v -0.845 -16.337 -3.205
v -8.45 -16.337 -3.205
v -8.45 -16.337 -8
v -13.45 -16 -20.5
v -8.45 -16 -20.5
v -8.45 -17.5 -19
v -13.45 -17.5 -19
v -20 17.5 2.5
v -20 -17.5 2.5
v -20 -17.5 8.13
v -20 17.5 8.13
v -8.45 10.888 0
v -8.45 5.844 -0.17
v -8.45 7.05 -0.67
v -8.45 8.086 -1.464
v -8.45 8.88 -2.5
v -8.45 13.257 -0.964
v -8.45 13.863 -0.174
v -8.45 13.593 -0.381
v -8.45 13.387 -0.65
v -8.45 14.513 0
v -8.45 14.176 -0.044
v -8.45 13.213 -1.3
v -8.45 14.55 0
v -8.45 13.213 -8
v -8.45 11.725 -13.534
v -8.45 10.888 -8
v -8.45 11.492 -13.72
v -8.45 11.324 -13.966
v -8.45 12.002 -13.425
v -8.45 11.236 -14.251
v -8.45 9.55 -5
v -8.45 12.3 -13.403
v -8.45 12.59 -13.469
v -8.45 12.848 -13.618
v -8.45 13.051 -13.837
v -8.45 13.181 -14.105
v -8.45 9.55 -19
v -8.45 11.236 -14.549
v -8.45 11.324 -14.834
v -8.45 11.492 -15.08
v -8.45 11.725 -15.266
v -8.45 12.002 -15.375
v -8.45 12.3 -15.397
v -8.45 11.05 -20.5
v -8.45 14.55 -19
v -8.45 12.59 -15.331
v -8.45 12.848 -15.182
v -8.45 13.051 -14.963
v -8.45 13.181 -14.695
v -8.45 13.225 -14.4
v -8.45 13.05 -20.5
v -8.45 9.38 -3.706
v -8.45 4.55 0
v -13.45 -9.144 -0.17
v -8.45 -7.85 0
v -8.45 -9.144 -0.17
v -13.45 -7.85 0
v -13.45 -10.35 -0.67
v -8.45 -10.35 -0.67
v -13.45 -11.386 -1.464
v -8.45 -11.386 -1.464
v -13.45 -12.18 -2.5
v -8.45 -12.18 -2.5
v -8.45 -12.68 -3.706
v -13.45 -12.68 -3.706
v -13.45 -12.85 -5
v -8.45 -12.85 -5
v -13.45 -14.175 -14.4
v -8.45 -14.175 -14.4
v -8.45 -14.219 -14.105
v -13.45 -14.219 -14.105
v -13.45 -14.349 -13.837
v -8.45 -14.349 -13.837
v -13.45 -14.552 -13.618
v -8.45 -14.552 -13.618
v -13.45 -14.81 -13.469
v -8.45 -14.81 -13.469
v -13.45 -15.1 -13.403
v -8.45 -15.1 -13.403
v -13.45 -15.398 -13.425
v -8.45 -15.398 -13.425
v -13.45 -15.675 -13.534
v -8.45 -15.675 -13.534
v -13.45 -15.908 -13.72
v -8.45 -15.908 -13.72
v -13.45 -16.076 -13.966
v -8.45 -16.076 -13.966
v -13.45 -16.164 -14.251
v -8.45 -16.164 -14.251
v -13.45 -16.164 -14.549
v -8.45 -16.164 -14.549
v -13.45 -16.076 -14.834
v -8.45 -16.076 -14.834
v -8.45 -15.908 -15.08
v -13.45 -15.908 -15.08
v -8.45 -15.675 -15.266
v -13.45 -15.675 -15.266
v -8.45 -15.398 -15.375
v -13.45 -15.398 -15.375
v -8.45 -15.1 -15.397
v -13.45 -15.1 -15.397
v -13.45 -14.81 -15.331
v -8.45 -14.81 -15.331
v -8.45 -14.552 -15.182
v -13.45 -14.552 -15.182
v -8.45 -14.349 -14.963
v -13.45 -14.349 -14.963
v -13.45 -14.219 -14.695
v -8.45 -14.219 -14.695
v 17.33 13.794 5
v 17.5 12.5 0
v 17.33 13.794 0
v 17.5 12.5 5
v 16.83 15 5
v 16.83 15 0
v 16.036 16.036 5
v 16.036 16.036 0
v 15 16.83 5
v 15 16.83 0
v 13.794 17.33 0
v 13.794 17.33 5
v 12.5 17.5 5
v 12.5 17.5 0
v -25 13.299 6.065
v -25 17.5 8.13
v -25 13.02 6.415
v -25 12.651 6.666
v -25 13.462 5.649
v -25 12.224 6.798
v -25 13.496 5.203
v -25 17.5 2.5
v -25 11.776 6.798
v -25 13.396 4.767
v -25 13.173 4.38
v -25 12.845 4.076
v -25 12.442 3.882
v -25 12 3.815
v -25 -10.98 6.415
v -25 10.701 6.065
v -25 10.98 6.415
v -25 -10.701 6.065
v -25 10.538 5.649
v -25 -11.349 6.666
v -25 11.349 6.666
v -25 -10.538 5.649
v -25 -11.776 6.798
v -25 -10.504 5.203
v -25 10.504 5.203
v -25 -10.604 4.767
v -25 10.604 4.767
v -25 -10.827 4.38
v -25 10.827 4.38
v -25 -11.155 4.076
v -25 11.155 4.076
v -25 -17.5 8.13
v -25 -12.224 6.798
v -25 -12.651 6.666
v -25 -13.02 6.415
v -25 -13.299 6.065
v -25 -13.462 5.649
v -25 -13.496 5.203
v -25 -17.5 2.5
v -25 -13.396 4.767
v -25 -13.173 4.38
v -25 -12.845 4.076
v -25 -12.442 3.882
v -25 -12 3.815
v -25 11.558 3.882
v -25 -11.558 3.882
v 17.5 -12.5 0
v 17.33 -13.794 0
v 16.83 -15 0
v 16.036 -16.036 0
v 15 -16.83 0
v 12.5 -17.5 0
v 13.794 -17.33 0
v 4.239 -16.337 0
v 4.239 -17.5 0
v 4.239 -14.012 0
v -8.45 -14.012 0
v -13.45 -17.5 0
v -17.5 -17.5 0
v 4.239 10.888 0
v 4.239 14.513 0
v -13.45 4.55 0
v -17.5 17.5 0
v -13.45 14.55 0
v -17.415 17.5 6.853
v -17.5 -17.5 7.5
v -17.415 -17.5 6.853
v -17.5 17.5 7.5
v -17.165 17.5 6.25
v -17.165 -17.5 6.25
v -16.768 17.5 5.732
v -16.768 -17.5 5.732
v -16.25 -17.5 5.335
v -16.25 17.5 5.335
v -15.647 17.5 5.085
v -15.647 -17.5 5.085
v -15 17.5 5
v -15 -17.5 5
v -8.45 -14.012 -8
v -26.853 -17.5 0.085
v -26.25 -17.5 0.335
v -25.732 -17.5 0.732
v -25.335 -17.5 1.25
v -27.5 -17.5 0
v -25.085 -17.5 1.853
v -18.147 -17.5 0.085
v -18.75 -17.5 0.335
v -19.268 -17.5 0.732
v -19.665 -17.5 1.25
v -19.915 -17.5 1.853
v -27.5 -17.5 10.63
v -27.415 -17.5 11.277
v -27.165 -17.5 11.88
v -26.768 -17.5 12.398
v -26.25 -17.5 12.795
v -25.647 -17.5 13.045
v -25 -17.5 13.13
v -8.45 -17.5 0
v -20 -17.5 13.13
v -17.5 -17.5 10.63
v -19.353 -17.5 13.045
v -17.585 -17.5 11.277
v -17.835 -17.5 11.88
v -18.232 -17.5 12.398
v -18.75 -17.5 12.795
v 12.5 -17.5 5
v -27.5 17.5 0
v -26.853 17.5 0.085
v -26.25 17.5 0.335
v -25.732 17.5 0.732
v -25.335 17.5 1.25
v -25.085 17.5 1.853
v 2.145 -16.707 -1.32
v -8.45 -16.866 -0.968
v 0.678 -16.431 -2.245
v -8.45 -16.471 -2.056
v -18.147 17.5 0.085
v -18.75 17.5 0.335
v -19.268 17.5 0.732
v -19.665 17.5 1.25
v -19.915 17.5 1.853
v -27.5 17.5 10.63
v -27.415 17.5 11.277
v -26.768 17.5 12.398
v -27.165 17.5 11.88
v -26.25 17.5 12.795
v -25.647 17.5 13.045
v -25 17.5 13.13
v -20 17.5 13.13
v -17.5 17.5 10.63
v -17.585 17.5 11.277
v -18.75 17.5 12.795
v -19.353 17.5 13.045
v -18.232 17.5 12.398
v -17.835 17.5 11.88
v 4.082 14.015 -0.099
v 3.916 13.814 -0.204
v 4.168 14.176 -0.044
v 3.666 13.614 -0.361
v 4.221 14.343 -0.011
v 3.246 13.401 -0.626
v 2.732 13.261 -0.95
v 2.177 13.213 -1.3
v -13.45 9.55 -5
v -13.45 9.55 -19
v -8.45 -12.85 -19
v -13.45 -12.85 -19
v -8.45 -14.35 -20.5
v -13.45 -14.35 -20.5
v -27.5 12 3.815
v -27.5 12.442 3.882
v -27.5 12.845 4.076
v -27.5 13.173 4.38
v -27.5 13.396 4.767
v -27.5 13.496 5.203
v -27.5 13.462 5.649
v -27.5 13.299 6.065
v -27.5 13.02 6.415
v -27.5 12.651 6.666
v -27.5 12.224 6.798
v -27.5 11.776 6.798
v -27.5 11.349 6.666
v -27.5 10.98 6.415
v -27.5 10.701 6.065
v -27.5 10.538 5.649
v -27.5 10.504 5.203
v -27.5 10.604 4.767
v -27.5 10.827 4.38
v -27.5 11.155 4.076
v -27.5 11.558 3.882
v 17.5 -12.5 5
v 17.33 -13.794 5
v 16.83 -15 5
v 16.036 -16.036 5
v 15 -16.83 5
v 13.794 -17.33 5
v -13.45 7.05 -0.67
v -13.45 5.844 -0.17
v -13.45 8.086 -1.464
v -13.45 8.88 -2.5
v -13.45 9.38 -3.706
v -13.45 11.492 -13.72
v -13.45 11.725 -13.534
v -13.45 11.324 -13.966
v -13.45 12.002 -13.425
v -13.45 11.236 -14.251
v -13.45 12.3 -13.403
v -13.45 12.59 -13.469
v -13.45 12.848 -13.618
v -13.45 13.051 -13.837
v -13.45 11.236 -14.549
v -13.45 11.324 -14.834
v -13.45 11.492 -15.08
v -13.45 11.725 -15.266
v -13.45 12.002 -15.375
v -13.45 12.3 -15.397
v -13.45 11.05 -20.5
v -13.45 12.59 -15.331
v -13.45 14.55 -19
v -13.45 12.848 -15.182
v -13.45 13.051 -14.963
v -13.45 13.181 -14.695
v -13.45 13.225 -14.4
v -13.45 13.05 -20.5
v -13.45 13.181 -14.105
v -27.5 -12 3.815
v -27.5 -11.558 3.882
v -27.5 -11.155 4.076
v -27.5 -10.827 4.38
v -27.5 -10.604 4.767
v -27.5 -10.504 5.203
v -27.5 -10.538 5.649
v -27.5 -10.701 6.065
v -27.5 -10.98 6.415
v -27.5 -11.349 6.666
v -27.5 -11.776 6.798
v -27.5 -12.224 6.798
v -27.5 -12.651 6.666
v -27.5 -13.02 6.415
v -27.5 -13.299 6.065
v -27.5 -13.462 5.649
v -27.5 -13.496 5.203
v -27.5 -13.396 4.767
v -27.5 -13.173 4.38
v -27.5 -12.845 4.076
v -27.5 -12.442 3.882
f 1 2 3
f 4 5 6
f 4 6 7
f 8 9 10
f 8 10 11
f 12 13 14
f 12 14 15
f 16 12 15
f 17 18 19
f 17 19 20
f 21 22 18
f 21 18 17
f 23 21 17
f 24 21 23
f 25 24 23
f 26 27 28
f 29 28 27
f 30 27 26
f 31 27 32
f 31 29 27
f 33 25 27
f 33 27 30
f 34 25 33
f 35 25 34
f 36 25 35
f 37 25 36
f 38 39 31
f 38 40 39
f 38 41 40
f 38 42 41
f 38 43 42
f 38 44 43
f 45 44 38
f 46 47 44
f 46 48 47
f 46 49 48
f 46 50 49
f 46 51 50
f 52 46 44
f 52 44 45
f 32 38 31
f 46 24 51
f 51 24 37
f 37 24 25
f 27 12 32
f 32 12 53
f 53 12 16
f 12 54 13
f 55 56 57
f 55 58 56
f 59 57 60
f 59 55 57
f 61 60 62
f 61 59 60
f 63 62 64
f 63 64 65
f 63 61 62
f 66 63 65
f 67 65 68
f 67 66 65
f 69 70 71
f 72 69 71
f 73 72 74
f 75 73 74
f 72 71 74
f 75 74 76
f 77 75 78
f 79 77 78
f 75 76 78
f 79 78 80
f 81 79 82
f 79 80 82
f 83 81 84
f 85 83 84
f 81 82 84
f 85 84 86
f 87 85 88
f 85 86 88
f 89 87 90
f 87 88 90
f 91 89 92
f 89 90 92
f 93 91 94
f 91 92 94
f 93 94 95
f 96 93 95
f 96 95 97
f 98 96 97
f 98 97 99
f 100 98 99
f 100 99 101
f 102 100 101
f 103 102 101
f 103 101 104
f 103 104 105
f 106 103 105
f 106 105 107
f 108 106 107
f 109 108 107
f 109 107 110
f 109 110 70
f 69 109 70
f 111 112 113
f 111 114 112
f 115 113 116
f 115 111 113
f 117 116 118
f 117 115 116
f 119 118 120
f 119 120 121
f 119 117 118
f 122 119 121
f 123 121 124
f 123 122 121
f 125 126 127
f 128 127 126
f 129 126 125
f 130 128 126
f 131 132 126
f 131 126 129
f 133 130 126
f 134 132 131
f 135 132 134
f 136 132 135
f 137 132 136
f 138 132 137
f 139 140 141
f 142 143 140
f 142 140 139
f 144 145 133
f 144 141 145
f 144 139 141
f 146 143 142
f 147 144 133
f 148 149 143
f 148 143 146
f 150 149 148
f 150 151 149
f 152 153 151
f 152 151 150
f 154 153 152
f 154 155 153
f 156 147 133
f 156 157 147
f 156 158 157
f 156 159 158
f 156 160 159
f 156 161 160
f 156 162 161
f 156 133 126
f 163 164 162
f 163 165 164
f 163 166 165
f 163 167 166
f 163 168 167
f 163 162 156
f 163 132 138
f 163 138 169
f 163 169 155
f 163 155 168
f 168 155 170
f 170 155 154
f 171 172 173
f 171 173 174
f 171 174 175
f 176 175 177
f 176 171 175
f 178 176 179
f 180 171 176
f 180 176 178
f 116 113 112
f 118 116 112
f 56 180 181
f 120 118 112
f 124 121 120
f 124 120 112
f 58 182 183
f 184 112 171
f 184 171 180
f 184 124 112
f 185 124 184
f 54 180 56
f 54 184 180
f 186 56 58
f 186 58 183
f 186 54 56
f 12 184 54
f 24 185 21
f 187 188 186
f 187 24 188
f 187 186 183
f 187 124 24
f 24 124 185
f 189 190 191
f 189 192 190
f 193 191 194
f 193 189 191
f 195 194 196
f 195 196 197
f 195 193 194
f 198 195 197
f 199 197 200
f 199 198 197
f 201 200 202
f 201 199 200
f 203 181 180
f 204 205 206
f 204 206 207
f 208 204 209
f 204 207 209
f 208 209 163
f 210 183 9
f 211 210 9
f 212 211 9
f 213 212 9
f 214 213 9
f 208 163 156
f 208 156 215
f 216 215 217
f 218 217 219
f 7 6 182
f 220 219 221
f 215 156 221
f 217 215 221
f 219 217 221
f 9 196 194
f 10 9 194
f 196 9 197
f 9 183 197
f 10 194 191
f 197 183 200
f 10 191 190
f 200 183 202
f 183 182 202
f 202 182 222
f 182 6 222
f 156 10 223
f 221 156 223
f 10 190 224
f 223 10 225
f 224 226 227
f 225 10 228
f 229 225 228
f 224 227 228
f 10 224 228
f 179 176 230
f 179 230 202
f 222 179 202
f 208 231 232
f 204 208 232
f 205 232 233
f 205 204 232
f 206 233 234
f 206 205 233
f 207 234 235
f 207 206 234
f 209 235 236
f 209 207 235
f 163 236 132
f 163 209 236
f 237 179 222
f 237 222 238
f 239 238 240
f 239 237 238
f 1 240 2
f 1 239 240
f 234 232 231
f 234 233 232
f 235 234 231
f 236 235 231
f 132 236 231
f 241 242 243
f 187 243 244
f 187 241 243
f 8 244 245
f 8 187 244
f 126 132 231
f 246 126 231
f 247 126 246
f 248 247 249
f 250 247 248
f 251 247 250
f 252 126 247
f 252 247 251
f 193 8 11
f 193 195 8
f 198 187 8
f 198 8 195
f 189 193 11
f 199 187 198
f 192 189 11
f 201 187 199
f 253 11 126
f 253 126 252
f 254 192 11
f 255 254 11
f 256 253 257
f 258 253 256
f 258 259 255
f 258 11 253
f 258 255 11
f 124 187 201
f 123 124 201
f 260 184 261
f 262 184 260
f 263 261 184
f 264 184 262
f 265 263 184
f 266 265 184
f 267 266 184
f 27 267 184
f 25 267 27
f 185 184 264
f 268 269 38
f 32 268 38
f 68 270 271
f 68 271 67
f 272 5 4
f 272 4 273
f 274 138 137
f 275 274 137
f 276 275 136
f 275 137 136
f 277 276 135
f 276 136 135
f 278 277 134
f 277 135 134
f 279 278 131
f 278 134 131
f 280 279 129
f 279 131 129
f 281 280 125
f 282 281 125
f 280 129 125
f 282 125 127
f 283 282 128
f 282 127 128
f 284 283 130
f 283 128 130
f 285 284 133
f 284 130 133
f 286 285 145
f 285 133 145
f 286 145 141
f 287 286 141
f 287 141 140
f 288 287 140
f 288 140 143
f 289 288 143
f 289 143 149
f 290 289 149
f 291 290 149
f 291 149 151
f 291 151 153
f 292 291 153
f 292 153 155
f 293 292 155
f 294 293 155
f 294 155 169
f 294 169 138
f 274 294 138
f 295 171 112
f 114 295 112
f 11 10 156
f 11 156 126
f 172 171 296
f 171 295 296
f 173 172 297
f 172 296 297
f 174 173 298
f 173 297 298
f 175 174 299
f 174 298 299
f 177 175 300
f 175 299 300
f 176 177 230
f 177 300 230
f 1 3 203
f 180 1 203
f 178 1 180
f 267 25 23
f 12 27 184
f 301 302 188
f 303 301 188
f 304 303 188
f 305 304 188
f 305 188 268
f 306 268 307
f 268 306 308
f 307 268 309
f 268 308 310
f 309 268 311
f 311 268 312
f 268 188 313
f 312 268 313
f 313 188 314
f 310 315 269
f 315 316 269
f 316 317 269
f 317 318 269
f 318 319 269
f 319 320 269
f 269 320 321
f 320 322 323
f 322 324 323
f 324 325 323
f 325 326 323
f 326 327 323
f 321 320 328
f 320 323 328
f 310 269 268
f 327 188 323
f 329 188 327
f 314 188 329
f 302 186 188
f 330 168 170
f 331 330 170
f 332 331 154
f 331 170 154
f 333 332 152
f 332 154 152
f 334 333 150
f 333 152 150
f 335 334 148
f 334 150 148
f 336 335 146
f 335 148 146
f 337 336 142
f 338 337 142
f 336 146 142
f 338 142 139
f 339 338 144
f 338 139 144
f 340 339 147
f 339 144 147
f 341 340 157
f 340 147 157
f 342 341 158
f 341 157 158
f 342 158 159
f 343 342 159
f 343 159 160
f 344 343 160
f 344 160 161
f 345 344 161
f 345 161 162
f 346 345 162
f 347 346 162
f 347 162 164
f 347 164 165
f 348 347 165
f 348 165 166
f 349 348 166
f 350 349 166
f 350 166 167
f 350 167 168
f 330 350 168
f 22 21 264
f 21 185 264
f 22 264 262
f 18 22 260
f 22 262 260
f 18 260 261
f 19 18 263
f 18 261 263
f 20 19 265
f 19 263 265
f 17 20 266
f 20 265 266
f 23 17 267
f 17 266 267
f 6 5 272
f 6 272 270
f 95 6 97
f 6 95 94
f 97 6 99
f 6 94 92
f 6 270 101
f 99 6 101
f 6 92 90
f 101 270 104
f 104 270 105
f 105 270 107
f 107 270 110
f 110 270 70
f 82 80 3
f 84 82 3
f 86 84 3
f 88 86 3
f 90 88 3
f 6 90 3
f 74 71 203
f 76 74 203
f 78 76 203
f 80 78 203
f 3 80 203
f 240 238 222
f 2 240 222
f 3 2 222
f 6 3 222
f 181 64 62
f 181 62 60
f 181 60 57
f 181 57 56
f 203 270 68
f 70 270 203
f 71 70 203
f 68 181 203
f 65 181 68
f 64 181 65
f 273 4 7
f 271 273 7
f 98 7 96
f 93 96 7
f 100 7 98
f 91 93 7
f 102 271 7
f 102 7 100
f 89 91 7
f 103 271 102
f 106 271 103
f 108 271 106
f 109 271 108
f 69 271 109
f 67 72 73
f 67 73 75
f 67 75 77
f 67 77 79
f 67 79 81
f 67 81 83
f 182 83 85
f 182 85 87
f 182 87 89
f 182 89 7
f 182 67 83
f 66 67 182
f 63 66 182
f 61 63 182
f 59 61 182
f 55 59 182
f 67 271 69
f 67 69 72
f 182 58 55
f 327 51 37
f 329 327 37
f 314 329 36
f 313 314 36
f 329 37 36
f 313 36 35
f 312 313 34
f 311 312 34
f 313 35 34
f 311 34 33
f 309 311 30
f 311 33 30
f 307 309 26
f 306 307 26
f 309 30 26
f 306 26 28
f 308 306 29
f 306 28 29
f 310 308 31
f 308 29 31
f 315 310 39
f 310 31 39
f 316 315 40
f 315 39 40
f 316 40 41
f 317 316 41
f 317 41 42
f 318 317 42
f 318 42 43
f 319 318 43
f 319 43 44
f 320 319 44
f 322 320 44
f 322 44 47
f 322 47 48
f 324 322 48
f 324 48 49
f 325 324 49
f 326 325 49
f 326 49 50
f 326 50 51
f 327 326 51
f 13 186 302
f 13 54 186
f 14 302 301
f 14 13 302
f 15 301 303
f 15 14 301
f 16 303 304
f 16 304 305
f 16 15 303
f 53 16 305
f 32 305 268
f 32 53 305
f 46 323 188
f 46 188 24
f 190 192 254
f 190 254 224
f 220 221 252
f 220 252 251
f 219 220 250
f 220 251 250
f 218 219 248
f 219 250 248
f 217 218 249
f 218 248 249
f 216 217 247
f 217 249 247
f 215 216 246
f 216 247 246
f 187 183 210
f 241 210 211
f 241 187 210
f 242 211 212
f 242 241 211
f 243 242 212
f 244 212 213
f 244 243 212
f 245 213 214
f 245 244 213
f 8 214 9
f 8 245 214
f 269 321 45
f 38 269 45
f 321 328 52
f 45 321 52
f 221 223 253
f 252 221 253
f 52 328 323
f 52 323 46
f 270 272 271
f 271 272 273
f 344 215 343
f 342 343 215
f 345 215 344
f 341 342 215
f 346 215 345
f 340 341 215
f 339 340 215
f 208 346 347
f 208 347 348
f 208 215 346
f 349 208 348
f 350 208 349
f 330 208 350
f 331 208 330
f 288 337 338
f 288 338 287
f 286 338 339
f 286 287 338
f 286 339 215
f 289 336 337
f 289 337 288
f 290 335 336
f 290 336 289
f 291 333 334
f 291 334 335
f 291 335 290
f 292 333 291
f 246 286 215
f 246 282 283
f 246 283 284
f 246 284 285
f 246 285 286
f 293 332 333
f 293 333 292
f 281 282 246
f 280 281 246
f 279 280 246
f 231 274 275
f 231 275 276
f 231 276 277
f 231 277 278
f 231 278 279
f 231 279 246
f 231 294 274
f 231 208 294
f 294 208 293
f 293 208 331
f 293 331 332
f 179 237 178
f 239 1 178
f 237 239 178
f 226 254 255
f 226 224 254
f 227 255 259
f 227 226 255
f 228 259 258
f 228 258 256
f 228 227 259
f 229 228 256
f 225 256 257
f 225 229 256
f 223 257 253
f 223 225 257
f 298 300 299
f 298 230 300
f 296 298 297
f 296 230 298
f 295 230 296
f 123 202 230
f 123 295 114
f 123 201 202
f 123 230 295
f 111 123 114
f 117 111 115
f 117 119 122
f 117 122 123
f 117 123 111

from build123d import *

# Parameters (mm, degrees)
ESQUISSE1_W             = 35
ESQUISSE1_H             = 35
BOSS_EXTRU_1_DEPTH      = 5
BOSS_EXTRU_2_DEPTH      = 13.13
ESQUISSE3_W             = 5
ESQUISSE3_H             = 35
BOSS_EXTRU_3_DEPTH      = 5
BOSS_EXTRU_4_START      = -19.05
ESQUISSE4_W             = 20.5
ESQUISSE4_H             = 4.65
BOSS_EXTRU_4_DEPTH      = 5
BOSS_EXTRU_5_START      = 27.4
ESQUISSE5_W             = 5
ESQUISSE5_H             = 20.5
BOSS_EXTRU_5_DEPTH      = 5
BOSS_EXTRU_6_START      = -1.1625
BOSS_EXTRU_6_DEPTH      = 2.325
BOSS_EXTRU_7_START      = 27.225
BOSS_EXTRU_7_DEPTH      = 2.325
CONG_3_R                = 5
CONG_4_R                = 1.3
CONG_5_R                = 5
ESQUISSE8_R             = 1
ENL_V_MAT_EXTRU_1_DEPTH = 38.415270946
CHANFREIN1_SIZE         = 1.5
CONG_6_R                = 5
CONG_7_R                = 2.5
CONG_8_R                = 2.5
CONG_9_R                = 2.5
ESQUISSE9_R             = 1.5
ENL_V_MAT_EXTRU_2_DEPTH = 51.326434406


# Some blends are built 0.0001 mm under size
with BuildPart() as part:
    # Esquisse1 → Boss.-Extru.1 (new body)
    with BuildSketch(Plane.XY):
        Rectangle(ESQUISSE1_W, ESQUISSE1_H)
    extrude(amount=BOSS_EXTRU_1_DEPTH)

    # Esquisse2 → Boss.-Extru.2 (add)
    with BuildSketch(Plane(origin=(0, 0, 0), x_dir=(-1, 0, 0), z_dir=(0, 0, -1))):
        Polygon((25, 15), (25, -15), (25, -17.5), (27.5, -17.5), (27.5, 17.5), (25, 17.5), align=None)
        Polygon((17.5, 17.5), (17.5, -17.5), (20, -17.5), (20, -15), (20, 15), (20, 17.5), align=None)
    extrude(amount=-BOSS_EXTRU_2_DEPTH)


with BuildPart() as boss_extru_2_piece_1:
    # of the separate pieces the step leaves, piece 1, a body of its own (boss_extru_2_pieces)
    add(part.part.solids().sort_by_distance((17.5, 17.5, 0))[0])



with BuildPart() as boss_extru_2_piece_2:
    # of the separate pieces the step leaves, piece 2, a body of its own (boss_extru_2_pieces)
    add(part.part.solids().sort_by_distance((-25, 17.5, 0))[0])


with BuildPart() as boss_extru_2_piece_1_1:
    add(boss_extru_2_piece_1.part)

    add(boss_extru_2_piece_2.part)  # Boss.-Extru.3 merges Boss.-Extru.2 piece 2
    # Esquisse3 → Boss.-Extru.3 (add)
    with BuildSketch(Plane.ZY.offset(20)):
        with Locations((10.63, 0)):
            Rectangle(ESQUISSE3_W, ESQUISSE3_H)
    extrude(amount=BOSS_EXTRU_3_DEPTH)

    # Esquisse4 → Boss.-Extru.4 (add)
    with BuildSketch(Plane.ZY.offset(27.5).offset(BOSS_EXTRU_4_START)):
        with Locations((-10.25, -15.175)):
            Rectangle(ESQUISSE4_W, ESQUISSE4_H)
    extrude(amount=BOSS_EXTRU_4_DEPTH)

    # Esquisse5 → Boss.-Extru.5 (add)
    with BuildSketch(Plane(origin=(0, -12.85, 0), x_dir=(1, 0, 0), z_dir=(0, 1, 0)).offset(BOSS_EXTRU_5_START)):
        with Locations((-10.95, 10.25)):
            Rectangle(ESQUISSE5_W, ESQUISSE5_H)
    extrude(amount=-BOSS_EXTRU_5_DEPTH)

    # Esquisse6 → Boss.-Extru.6 (add)
    with BuildSketch(Plane.XZ.offset(17.5).offset(BOSS_EXTRU_6_START)):
        Polygon((-8.45, -8), (4.23857754, 0), (-8.45, 0), align=None)
    extrude(amount=-BOSS_EXTRU_6_DEPTH)

    # Esquisse7 → Boss.-Extru.7 (add)
    with BuildSketch(Plane(origin=(0, -14.0125, 0), x_dir=(1, 0, 0), z_dir=(0, 1, 0)).offset(BOSS_EXTRU_7_START)):
        Polygon((-8.45, 8), (-8.45, 0), (4.23857754, 0), align=None)
    extrude(amount=-BOSS_EXTRU_7_DEPTH)

    # Congé3
    # the kernel refuses this fillet: 5 mm, written as the material it adds along each edge
    with BuildSketch(Plane(origin=(12.251689354, -16.3375, 0), x_dir=(0, -1, 0), z_dir=(-1, 0, 0))) as cong_3_piece_1_section:
        with BuildLine():
            CenterArc((5, -3.205244725), CONG_3_R, 140.129918766, 39.870081234)
            Line((0, -3.205244725), (0, 0))
            Line((0, 0), (1.1625, 0))
        make_face()
    cong_3_piece_1 = extrude(amount=20.701689354, mode=Mode.PRIVATE)
    cong_3_piece_1 = split(cong_3_piece_1, bisect_by=Plane(origin=(-0.976512405, -16.627700283, -3.288053324), z_dir=(-0.5333333333333334, 0, 0.8459051693633013)), keep=Keep.TOP, mode=Mode.PRIVATE)
    add(cong_3_piece_1)

    # Congé4
    cong_4_edges = [boss_extru_2_piece_1_1.edges().sort_by_distance(p)[0] for p in [
        (-2.10571123, 13.2125, 0),
    ]]
    fillet(cong_4_edges, radius=CONG_4_R)

    # Congé5
    cong_5_edges = [boss_extru_2_piece_1_1.edges().sort_by_distance(p)[0] for p in [
        (17.5, -17.5, 2.5),
        (17.5, 17.5, 2.5),
    ]]
    fillet(cong_5_edges, radius=CONG_5_R)

    # Esquisse8 → Enlèv. mat.-Extru.1 (cut, through all)
    with BuildSketch(Plane(origin=(-8.45, 0, 0), x_dir=(0, 0, -1), z_dir=(1, 0, 0))):
        with Locations(Location((14.4, 12.225, 0), (0, 0, 90))):
            Circle(ESQUISSE8_R)
        with Locations(Location((14.4, -15.175, 0), (0, 0, 90))):
            Circle(ESQUISSE8_R)
    extrude(amount=-ENL_V_MAT_EXTRU_1_DEPTH, mode=Mode.SUBTRACT)

    # Chanfrein1
    chanfrein1_edges = [boss_extru_2_piece_1_1.edges().sort_by_distance(p)[0] for p in [
        (-10.95, -12.85, -20.5),
        (-10.95, -17.5, -20.5),
        (-10.95, 9.55, -20.5),
        (-10.95, 14.55, -20.5),
    ]]
    chamfer(chanfrein1_edges, length=CHANFREIN1_SIZE)

    # Congé6
    cong_6_edges = [boss_extru_2_piece_1_1.edges().sort_by_distance(p)[0] for p in [
        (-10.95, -12.85, 0),
        (-10.95, 9.55, 0),
    ]]
    fillet(cong_6_edges, radius=CONG_6_R)

    # Congé7
    cong_7_edges = [boss_extru_2_piece_1_1.edges().sort_by_distance(p)[0] for p in [
        (-17.5, 0, 13.13),
        (-27.5, 0, 13.13),
    ]]
    fillet(cong_7_edges, radius=CONG_7_R)

    # Congé8
    cong_8_edges = [boss_extru_2_piece_1_1.edges().sort_by_distance(p)[0] for p in [
        (-17.5, 0, 5),
    ]]
    fillet(cong_8_edges, radius=CONG_8_R)

    # Congé9
    cong_9_edges = [boss_extru_2_piece_1_1.edges().sort_by_distance(p)[0] for p in [
        (-20, 0, 0),
        (-25, 0, 0),
    ]]
    fillet(cong_9_edges, radius=CONG_9_R - 0.0001)  # a hair under: the kernel refuses the full size

    # Esquisse9 → Enlèv. mat.-Extru.2 (cut, through all)
    with BuildSketch(Plane(origin=(-25, 0, 0), x_dir=(0, 0, -1), z_dir=(1, 0, 0))):
        with Locations((-5.315, -12)):
            Circle(ESQUISSE9_R)
        with Locations((-5.315, 12)):
            Circle(ESQUISSE9_R)
    extrude(amount=-ENL_V_MAT_EXTRU_2_DEPTH, mode=Mode.SUBTRACT)


solid = boss_extru_2_piece_1_1.part
